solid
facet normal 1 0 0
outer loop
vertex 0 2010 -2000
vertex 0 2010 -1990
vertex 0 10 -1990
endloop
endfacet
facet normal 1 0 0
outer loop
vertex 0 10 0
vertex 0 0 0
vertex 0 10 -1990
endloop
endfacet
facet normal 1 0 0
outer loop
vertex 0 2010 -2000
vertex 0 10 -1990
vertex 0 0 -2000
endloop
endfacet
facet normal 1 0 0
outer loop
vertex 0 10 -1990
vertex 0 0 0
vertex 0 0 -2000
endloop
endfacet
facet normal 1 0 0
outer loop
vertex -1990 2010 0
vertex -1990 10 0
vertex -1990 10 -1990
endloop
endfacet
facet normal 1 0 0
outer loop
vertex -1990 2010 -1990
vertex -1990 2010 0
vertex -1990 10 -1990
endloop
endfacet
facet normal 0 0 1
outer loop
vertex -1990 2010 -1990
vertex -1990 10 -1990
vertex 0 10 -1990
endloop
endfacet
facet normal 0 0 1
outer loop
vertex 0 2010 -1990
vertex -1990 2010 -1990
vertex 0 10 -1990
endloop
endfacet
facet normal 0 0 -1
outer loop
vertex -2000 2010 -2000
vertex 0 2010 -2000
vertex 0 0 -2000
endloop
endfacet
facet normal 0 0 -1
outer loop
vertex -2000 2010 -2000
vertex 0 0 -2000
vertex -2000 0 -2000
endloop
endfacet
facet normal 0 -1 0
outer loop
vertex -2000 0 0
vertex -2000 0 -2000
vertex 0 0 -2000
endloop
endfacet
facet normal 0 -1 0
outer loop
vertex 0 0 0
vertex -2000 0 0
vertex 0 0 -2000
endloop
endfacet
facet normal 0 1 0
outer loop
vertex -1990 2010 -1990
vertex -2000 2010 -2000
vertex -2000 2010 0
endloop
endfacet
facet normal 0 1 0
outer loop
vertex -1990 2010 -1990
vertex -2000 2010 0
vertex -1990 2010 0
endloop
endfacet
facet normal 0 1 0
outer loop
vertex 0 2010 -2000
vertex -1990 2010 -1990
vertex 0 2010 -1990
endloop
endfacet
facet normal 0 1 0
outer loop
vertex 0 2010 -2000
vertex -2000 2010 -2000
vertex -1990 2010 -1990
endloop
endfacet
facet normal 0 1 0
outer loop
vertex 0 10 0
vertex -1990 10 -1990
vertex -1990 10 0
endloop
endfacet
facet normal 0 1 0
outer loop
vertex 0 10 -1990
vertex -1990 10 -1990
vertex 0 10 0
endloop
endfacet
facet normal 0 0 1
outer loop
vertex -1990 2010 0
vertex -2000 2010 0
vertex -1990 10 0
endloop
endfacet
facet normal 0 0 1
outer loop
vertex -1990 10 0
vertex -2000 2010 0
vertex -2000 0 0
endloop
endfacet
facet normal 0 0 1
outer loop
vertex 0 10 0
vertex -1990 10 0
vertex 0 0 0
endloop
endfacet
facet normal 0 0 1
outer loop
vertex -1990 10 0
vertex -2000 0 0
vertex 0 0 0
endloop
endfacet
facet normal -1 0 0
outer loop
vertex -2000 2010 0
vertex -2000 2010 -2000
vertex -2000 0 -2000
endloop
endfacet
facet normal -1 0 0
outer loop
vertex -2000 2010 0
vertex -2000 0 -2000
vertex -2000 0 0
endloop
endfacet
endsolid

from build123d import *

# Parameters (mm, degrees)
SKETCH1_W           = 2000
SKETCH1_H           = 2000
BOSS_EXTRUDE1_DEPTH = 10
SKETCH2_W           = 1990
SKETCH2_H           = 10
SKETCH2_W_2         = 10
SKETCH2_H_2         = 1990
BOSS_EXTRUDE2_DEPTH = 2000


with BuildPart() as part:
    # Sketch1 → Boss-Extrude1 (new body)
    with BuildSketch(Plane(origin=(0, 0, 0), x_dir=(1, 0, 0), z_dir=(0, 1, 0))):
        with Locations((-1000, 1000)):
            Rectangle(SKETCH1_W, SKETCH1_H)
    extrude(amount=BOSS_EXTRUDE1_DEPTH)

    # Sketch2 → Boss-Extrude2 (add)
    with BuildSketch(Plane(origin=(0, 10, 0), x_dir=(1, 0, 0), z_dir=(0, 1, 0))):
        with Locations((-995, 1995)):
            Rectangle(SKETCH2_W, SKETCH2_H)
        with Locations((-1995, 1995)):
            Rectangle(SKETCH2_W_2, SKETCH2_H)
        with Locations((-1995, 995)):
            Rectangle(SKETCH2_W_2, SKETCH2_H_2)
    extrude(amount=BOSS_EXTRUDE2_DEPTH)


solid = part.part
